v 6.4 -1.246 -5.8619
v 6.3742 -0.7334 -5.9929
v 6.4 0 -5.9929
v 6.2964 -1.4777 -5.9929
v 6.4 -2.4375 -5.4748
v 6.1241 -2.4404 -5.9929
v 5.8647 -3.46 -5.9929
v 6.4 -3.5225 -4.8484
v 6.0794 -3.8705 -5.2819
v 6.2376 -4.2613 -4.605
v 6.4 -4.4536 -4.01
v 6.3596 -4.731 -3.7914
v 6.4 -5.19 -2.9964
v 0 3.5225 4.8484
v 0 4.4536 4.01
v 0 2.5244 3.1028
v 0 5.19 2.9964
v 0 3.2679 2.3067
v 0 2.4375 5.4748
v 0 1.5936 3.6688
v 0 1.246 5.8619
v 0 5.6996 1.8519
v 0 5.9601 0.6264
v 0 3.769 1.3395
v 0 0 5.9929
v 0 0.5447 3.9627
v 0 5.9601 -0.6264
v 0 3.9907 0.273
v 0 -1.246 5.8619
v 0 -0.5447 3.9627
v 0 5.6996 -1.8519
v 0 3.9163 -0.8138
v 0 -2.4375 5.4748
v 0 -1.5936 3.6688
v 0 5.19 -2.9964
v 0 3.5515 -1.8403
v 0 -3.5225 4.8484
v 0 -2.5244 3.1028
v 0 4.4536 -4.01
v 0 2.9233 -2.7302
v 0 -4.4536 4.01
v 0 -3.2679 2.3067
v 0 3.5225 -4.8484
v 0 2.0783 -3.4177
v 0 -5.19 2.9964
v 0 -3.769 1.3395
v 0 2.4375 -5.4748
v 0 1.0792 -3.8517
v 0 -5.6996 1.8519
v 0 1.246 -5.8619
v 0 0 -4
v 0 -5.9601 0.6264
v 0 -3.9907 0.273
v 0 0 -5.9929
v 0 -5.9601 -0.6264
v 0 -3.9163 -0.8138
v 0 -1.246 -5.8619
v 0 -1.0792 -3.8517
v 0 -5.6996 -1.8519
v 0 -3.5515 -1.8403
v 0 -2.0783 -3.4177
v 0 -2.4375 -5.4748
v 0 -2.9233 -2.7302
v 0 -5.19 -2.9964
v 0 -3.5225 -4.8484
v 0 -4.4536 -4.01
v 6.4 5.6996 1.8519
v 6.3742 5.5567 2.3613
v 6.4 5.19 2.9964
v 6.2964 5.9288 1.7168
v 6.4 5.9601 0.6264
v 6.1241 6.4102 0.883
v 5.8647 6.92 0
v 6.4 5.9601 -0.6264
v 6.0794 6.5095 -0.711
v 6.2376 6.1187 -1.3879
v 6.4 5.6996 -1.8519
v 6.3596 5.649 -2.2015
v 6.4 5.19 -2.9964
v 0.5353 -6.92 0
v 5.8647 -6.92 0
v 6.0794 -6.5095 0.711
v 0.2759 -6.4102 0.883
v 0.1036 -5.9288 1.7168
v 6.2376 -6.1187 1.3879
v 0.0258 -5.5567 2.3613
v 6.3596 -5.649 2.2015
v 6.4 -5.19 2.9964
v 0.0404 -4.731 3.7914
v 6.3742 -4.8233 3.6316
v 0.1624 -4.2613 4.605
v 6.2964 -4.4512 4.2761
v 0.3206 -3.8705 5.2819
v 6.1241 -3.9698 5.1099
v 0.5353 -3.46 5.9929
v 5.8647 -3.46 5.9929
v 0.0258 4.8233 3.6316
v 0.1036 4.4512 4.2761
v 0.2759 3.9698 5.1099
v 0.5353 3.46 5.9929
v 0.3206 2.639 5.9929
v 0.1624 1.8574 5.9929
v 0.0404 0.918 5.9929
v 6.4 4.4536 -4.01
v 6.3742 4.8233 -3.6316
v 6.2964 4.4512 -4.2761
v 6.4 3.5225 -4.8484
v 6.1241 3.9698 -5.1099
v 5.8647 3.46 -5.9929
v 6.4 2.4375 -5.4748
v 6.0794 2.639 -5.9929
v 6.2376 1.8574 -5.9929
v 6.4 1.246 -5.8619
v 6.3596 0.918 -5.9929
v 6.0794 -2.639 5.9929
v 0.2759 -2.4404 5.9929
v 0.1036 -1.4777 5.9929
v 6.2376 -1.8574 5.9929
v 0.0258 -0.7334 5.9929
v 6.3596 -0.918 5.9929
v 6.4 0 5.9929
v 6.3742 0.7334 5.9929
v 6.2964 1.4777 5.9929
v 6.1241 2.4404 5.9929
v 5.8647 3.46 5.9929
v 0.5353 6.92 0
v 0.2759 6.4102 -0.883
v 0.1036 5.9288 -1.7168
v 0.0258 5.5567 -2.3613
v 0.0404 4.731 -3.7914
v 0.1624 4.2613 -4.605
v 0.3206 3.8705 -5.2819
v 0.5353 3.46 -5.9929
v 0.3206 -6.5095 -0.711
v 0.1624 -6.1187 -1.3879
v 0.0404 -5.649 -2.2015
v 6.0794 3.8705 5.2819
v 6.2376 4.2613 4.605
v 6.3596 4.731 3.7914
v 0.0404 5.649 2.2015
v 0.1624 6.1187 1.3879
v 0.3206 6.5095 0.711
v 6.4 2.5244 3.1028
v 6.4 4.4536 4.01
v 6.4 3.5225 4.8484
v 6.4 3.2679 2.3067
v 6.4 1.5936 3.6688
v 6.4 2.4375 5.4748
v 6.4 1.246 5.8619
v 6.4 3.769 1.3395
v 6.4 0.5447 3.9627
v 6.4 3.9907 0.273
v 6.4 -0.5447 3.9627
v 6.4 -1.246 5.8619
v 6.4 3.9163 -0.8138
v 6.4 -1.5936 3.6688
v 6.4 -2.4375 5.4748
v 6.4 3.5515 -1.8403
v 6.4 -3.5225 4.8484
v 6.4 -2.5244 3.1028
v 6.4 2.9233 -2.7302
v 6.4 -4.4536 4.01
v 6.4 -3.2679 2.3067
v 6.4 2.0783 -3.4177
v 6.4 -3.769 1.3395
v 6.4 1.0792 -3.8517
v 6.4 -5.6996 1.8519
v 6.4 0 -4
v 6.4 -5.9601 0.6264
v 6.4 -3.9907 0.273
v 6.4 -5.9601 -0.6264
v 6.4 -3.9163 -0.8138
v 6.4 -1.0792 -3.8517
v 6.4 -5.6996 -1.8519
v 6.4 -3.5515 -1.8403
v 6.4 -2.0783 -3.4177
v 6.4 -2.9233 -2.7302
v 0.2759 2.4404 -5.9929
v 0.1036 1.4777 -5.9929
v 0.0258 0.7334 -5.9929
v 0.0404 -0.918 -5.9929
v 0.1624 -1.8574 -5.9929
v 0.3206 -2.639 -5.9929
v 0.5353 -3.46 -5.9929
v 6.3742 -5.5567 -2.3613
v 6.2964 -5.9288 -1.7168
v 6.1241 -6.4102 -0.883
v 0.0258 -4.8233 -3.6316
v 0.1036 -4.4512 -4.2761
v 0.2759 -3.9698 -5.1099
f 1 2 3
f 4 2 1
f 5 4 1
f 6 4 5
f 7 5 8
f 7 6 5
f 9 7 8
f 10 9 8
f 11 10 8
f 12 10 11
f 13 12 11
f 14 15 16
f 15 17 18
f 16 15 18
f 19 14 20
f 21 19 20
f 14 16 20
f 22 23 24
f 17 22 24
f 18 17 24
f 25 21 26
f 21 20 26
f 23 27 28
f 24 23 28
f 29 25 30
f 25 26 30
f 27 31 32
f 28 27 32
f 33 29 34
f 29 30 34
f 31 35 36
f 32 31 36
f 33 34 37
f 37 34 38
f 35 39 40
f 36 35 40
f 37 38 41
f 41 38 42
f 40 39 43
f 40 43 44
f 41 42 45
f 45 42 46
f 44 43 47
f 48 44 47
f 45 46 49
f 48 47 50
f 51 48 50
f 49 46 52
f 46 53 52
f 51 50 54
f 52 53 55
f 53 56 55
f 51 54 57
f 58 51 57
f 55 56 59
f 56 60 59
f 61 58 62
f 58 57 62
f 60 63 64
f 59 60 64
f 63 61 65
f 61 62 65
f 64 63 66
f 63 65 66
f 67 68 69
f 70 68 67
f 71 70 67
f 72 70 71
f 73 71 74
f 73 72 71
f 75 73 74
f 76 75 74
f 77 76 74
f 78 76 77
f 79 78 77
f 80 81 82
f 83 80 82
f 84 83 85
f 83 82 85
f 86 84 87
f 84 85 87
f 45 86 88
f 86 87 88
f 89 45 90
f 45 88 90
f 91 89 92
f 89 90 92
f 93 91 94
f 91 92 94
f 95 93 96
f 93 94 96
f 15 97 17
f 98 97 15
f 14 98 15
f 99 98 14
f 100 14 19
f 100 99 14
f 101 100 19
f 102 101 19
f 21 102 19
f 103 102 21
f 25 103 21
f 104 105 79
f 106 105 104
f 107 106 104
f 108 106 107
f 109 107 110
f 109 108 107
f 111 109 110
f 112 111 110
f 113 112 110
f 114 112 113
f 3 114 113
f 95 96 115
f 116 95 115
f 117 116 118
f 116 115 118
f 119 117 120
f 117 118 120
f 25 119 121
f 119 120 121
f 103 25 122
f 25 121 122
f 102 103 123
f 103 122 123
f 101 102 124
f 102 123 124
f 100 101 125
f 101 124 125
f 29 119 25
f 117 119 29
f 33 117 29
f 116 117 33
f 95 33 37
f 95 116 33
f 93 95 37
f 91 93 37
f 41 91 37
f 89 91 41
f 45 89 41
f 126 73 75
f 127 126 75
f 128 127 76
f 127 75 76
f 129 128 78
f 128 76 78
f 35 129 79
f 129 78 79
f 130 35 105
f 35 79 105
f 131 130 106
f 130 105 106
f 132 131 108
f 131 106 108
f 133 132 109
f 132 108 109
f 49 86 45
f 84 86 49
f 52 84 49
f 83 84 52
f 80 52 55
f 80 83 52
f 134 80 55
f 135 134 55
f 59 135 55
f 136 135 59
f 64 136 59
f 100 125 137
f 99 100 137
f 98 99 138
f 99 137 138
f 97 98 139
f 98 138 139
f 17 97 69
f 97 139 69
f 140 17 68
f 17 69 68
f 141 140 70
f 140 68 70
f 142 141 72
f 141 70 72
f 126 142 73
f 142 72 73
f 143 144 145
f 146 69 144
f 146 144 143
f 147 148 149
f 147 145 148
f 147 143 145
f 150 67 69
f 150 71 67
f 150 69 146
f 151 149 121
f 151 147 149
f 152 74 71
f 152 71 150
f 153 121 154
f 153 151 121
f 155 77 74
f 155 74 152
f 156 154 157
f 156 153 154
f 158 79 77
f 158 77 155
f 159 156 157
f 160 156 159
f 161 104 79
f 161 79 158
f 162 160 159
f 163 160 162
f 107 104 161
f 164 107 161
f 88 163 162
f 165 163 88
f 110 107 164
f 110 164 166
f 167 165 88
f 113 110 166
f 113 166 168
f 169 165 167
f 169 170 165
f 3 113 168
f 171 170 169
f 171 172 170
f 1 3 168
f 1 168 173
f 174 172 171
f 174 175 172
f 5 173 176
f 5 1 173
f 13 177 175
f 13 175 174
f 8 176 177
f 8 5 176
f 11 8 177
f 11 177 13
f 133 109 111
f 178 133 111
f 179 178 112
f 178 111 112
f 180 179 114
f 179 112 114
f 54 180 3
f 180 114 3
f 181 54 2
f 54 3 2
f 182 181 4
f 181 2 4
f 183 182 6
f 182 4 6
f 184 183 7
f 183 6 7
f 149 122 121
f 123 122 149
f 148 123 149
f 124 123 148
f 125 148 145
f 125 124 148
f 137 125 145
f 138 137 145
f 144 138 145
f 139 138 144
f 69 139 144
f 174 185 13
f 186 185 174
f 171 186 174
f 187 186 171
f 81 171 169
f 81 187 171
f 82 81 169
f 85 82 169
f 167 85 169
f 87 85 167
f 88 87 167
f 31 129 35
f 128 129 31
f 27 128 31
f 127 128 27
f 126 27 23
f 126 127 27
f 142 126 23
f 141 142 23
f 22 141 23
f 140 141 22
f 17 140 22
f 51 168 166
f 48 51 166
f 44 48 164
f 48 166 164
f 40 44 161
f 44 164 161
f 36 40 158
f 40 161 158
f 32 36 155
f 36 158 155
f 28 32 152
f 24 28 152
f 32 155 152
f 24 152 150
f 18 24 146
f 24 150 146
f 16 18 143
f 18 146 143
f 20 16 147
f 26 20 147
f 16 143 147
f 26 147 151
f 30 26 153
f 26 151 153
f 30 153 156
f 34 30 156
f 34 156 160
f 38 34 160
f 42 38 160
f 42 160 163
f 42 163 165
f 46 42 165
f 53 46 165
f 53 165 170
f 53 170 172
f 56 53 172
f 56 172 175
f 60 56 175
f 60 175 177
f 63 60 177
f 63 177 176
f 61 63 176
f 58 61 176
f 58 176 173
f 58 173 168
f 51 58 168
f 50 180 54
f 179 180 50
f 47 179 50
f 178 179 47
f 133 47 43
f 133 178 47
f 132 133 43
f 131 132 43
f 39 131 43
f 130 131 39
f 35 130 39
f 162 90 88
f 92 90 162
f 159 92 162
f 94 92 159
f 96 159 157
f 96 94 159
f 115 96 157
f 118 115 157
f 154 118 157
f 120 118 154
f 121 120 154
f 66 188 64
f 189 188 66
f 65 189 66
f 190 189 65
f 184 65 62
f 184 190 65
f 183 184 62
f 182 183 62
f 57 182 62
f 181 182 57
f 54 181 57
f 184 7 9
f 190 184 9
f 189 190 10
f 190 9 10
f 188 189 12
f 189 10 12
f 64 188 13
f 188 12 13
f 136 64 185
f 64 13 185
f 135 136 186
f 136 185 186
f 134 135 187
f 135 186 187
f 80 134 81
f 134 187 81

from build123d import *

# Parameters (mm, degrees)
CROQUIS1_W            = 6.4
CROQUIS1_H            = 6.92
CORTAR_EXTRUIR1_DEPTH = 7
CROQUIS3_OUTSIDE_W    = 42.114
CROQUIS3_OUTSIDE_H    = 43.968
CROQUIS3_OUTSIDE_R    = 5.992895794
CORTAR_EXTRUIR2_DEPTH = 7
CORTAR_EXTRUIR2_TAPER = 60
CROQUIS5_OUTSIDE_W    = 21.33
CROQUIS5_OUTSIDE_H    = 23.184
CROQUIS5_OUTSIDE_R    = 5.992895794
CORTAR_EXTRUIR3_DEPTH = 1
CORTAR_EXTRUIR3_TAPER = 60
CROQUIS6_R            = 4
CORTAR_EXTRUIR4_DEPTH = 7


with BuildPart() as part:
    # Croquis1 → Revolución1 (revolve)
    with BuildSketch(Plane.XY):
        with Locations((3.2, 3.46)):
            Rectangle(CROQUIS1_W, CROQUIS1_H)
    revolve(axis=Axis((6.4, 0, 0), (-1, 0, 0)))

    # Croquis2 → Cortar-Extruir1 (cut)
    with BuildSketch(Plane(origin=(6.4, 0, 0), x_dir=(0, 0, -1), z_dir=(1, 0, 0))):
        with BuildLine():
            Line((-5.992895794, -3.46), (-5.992895794, 3.46))
            ThreePointArc((-5.992895794, 3.46), (-6.92, 0), (-5.992895794, -3.46))
        make_face()
        with BuildLine():
            Line((-5.992895794, 3.46), (0, 6.92))
            ThreePointArc((0, 6.92), (-3.46, 5.992895794), (-5.992895794, 3.46))
        make_face()
        with BuildLine():
            ThreePointArc((5.992895794, 3.46), (3.46, 5.992895794), (0, 6.92))
            Line((0, 6.92), (5.992895794, 3.46))
        make_face()
        with BuildLine():
            ThreePointArc((6.92, 0), (6.684206718, 1.791027792), (5.992895794, 3.46))
            Line((5.992895794, 3.46), (5.992895794, -3.46))
            ThreePointArc((5.992895794, -3.46), (6.684206718, -1.791027792), (6.92, 0))
        make_face()
        with BuildLine():
            ThreePointArc((0, -6.92), (3.46, -5.992895794), (5.992895794, -3.46))
            Line((5.992895794, -3.46), (0, -6.92))
        make_face()
        with BuildLine():
            Line((0, -6.92), (-5.992895794, -3.46))
            ThreePointArc((-5.992895794, -3.46), (-3.46, -5.992895794), (0, -6.92))
        make_face()
    extrude(amount=-CORTAR_EXTRUIR1_DEPTH, mode=Mode.SUBTRACT)

    # Croquis3 outside → Cortar-Extruir2 (cut)
    with BuildSketch(Plane(origin=(6.4, 0, 0), x_dir=(0, 0, -1), z_dir=(1, 0, 0))):
        Rectangle(CROQUIS3_OUTSIDE_W, CROQUIS3_OUTSIDE_H)
        Circle(CROQUIS3_OUTSIDE_R, mode=Mode.SUBTRACT)
    extrude(amount=-CORTAR_EXTRUIR2_DEPTH, taper=CORTAR_EXTRUIR2_TAPER, mode=Mode.SUBTRACT)

    # Croquis5 outside → Cortar-Extruir3 (cut)
    with BuildSketch(Plane.ZY):
        Rectangle(CROQUIS5_OUTSIDE_W, CROQUIS5_OUTSIDE_H)
        Circle(CROQUIS5_OUTSIDE_R, mode=Mode.SUBTRACT)
    extrude(amount=-CORTAR_EXTRUIR3_DEPTH, taper=CORTAR_EXTRUIR3_TAPER, mode=Mode.SUBTRACT)

    # Croquis6 → Cortar-Extruir4 (cut)
    with BuildSketch(Plane(origin=(6.4, 0, 0), x_dir=(0, 0, -1), z_dir=(1, 0, 0))):
        Circle(CROQUIS6_R)
    extrude(amount=-CORTAR_EXTRUIR4_DEPTH, mode=Mode.SUBTRACT)


solid = part.part
